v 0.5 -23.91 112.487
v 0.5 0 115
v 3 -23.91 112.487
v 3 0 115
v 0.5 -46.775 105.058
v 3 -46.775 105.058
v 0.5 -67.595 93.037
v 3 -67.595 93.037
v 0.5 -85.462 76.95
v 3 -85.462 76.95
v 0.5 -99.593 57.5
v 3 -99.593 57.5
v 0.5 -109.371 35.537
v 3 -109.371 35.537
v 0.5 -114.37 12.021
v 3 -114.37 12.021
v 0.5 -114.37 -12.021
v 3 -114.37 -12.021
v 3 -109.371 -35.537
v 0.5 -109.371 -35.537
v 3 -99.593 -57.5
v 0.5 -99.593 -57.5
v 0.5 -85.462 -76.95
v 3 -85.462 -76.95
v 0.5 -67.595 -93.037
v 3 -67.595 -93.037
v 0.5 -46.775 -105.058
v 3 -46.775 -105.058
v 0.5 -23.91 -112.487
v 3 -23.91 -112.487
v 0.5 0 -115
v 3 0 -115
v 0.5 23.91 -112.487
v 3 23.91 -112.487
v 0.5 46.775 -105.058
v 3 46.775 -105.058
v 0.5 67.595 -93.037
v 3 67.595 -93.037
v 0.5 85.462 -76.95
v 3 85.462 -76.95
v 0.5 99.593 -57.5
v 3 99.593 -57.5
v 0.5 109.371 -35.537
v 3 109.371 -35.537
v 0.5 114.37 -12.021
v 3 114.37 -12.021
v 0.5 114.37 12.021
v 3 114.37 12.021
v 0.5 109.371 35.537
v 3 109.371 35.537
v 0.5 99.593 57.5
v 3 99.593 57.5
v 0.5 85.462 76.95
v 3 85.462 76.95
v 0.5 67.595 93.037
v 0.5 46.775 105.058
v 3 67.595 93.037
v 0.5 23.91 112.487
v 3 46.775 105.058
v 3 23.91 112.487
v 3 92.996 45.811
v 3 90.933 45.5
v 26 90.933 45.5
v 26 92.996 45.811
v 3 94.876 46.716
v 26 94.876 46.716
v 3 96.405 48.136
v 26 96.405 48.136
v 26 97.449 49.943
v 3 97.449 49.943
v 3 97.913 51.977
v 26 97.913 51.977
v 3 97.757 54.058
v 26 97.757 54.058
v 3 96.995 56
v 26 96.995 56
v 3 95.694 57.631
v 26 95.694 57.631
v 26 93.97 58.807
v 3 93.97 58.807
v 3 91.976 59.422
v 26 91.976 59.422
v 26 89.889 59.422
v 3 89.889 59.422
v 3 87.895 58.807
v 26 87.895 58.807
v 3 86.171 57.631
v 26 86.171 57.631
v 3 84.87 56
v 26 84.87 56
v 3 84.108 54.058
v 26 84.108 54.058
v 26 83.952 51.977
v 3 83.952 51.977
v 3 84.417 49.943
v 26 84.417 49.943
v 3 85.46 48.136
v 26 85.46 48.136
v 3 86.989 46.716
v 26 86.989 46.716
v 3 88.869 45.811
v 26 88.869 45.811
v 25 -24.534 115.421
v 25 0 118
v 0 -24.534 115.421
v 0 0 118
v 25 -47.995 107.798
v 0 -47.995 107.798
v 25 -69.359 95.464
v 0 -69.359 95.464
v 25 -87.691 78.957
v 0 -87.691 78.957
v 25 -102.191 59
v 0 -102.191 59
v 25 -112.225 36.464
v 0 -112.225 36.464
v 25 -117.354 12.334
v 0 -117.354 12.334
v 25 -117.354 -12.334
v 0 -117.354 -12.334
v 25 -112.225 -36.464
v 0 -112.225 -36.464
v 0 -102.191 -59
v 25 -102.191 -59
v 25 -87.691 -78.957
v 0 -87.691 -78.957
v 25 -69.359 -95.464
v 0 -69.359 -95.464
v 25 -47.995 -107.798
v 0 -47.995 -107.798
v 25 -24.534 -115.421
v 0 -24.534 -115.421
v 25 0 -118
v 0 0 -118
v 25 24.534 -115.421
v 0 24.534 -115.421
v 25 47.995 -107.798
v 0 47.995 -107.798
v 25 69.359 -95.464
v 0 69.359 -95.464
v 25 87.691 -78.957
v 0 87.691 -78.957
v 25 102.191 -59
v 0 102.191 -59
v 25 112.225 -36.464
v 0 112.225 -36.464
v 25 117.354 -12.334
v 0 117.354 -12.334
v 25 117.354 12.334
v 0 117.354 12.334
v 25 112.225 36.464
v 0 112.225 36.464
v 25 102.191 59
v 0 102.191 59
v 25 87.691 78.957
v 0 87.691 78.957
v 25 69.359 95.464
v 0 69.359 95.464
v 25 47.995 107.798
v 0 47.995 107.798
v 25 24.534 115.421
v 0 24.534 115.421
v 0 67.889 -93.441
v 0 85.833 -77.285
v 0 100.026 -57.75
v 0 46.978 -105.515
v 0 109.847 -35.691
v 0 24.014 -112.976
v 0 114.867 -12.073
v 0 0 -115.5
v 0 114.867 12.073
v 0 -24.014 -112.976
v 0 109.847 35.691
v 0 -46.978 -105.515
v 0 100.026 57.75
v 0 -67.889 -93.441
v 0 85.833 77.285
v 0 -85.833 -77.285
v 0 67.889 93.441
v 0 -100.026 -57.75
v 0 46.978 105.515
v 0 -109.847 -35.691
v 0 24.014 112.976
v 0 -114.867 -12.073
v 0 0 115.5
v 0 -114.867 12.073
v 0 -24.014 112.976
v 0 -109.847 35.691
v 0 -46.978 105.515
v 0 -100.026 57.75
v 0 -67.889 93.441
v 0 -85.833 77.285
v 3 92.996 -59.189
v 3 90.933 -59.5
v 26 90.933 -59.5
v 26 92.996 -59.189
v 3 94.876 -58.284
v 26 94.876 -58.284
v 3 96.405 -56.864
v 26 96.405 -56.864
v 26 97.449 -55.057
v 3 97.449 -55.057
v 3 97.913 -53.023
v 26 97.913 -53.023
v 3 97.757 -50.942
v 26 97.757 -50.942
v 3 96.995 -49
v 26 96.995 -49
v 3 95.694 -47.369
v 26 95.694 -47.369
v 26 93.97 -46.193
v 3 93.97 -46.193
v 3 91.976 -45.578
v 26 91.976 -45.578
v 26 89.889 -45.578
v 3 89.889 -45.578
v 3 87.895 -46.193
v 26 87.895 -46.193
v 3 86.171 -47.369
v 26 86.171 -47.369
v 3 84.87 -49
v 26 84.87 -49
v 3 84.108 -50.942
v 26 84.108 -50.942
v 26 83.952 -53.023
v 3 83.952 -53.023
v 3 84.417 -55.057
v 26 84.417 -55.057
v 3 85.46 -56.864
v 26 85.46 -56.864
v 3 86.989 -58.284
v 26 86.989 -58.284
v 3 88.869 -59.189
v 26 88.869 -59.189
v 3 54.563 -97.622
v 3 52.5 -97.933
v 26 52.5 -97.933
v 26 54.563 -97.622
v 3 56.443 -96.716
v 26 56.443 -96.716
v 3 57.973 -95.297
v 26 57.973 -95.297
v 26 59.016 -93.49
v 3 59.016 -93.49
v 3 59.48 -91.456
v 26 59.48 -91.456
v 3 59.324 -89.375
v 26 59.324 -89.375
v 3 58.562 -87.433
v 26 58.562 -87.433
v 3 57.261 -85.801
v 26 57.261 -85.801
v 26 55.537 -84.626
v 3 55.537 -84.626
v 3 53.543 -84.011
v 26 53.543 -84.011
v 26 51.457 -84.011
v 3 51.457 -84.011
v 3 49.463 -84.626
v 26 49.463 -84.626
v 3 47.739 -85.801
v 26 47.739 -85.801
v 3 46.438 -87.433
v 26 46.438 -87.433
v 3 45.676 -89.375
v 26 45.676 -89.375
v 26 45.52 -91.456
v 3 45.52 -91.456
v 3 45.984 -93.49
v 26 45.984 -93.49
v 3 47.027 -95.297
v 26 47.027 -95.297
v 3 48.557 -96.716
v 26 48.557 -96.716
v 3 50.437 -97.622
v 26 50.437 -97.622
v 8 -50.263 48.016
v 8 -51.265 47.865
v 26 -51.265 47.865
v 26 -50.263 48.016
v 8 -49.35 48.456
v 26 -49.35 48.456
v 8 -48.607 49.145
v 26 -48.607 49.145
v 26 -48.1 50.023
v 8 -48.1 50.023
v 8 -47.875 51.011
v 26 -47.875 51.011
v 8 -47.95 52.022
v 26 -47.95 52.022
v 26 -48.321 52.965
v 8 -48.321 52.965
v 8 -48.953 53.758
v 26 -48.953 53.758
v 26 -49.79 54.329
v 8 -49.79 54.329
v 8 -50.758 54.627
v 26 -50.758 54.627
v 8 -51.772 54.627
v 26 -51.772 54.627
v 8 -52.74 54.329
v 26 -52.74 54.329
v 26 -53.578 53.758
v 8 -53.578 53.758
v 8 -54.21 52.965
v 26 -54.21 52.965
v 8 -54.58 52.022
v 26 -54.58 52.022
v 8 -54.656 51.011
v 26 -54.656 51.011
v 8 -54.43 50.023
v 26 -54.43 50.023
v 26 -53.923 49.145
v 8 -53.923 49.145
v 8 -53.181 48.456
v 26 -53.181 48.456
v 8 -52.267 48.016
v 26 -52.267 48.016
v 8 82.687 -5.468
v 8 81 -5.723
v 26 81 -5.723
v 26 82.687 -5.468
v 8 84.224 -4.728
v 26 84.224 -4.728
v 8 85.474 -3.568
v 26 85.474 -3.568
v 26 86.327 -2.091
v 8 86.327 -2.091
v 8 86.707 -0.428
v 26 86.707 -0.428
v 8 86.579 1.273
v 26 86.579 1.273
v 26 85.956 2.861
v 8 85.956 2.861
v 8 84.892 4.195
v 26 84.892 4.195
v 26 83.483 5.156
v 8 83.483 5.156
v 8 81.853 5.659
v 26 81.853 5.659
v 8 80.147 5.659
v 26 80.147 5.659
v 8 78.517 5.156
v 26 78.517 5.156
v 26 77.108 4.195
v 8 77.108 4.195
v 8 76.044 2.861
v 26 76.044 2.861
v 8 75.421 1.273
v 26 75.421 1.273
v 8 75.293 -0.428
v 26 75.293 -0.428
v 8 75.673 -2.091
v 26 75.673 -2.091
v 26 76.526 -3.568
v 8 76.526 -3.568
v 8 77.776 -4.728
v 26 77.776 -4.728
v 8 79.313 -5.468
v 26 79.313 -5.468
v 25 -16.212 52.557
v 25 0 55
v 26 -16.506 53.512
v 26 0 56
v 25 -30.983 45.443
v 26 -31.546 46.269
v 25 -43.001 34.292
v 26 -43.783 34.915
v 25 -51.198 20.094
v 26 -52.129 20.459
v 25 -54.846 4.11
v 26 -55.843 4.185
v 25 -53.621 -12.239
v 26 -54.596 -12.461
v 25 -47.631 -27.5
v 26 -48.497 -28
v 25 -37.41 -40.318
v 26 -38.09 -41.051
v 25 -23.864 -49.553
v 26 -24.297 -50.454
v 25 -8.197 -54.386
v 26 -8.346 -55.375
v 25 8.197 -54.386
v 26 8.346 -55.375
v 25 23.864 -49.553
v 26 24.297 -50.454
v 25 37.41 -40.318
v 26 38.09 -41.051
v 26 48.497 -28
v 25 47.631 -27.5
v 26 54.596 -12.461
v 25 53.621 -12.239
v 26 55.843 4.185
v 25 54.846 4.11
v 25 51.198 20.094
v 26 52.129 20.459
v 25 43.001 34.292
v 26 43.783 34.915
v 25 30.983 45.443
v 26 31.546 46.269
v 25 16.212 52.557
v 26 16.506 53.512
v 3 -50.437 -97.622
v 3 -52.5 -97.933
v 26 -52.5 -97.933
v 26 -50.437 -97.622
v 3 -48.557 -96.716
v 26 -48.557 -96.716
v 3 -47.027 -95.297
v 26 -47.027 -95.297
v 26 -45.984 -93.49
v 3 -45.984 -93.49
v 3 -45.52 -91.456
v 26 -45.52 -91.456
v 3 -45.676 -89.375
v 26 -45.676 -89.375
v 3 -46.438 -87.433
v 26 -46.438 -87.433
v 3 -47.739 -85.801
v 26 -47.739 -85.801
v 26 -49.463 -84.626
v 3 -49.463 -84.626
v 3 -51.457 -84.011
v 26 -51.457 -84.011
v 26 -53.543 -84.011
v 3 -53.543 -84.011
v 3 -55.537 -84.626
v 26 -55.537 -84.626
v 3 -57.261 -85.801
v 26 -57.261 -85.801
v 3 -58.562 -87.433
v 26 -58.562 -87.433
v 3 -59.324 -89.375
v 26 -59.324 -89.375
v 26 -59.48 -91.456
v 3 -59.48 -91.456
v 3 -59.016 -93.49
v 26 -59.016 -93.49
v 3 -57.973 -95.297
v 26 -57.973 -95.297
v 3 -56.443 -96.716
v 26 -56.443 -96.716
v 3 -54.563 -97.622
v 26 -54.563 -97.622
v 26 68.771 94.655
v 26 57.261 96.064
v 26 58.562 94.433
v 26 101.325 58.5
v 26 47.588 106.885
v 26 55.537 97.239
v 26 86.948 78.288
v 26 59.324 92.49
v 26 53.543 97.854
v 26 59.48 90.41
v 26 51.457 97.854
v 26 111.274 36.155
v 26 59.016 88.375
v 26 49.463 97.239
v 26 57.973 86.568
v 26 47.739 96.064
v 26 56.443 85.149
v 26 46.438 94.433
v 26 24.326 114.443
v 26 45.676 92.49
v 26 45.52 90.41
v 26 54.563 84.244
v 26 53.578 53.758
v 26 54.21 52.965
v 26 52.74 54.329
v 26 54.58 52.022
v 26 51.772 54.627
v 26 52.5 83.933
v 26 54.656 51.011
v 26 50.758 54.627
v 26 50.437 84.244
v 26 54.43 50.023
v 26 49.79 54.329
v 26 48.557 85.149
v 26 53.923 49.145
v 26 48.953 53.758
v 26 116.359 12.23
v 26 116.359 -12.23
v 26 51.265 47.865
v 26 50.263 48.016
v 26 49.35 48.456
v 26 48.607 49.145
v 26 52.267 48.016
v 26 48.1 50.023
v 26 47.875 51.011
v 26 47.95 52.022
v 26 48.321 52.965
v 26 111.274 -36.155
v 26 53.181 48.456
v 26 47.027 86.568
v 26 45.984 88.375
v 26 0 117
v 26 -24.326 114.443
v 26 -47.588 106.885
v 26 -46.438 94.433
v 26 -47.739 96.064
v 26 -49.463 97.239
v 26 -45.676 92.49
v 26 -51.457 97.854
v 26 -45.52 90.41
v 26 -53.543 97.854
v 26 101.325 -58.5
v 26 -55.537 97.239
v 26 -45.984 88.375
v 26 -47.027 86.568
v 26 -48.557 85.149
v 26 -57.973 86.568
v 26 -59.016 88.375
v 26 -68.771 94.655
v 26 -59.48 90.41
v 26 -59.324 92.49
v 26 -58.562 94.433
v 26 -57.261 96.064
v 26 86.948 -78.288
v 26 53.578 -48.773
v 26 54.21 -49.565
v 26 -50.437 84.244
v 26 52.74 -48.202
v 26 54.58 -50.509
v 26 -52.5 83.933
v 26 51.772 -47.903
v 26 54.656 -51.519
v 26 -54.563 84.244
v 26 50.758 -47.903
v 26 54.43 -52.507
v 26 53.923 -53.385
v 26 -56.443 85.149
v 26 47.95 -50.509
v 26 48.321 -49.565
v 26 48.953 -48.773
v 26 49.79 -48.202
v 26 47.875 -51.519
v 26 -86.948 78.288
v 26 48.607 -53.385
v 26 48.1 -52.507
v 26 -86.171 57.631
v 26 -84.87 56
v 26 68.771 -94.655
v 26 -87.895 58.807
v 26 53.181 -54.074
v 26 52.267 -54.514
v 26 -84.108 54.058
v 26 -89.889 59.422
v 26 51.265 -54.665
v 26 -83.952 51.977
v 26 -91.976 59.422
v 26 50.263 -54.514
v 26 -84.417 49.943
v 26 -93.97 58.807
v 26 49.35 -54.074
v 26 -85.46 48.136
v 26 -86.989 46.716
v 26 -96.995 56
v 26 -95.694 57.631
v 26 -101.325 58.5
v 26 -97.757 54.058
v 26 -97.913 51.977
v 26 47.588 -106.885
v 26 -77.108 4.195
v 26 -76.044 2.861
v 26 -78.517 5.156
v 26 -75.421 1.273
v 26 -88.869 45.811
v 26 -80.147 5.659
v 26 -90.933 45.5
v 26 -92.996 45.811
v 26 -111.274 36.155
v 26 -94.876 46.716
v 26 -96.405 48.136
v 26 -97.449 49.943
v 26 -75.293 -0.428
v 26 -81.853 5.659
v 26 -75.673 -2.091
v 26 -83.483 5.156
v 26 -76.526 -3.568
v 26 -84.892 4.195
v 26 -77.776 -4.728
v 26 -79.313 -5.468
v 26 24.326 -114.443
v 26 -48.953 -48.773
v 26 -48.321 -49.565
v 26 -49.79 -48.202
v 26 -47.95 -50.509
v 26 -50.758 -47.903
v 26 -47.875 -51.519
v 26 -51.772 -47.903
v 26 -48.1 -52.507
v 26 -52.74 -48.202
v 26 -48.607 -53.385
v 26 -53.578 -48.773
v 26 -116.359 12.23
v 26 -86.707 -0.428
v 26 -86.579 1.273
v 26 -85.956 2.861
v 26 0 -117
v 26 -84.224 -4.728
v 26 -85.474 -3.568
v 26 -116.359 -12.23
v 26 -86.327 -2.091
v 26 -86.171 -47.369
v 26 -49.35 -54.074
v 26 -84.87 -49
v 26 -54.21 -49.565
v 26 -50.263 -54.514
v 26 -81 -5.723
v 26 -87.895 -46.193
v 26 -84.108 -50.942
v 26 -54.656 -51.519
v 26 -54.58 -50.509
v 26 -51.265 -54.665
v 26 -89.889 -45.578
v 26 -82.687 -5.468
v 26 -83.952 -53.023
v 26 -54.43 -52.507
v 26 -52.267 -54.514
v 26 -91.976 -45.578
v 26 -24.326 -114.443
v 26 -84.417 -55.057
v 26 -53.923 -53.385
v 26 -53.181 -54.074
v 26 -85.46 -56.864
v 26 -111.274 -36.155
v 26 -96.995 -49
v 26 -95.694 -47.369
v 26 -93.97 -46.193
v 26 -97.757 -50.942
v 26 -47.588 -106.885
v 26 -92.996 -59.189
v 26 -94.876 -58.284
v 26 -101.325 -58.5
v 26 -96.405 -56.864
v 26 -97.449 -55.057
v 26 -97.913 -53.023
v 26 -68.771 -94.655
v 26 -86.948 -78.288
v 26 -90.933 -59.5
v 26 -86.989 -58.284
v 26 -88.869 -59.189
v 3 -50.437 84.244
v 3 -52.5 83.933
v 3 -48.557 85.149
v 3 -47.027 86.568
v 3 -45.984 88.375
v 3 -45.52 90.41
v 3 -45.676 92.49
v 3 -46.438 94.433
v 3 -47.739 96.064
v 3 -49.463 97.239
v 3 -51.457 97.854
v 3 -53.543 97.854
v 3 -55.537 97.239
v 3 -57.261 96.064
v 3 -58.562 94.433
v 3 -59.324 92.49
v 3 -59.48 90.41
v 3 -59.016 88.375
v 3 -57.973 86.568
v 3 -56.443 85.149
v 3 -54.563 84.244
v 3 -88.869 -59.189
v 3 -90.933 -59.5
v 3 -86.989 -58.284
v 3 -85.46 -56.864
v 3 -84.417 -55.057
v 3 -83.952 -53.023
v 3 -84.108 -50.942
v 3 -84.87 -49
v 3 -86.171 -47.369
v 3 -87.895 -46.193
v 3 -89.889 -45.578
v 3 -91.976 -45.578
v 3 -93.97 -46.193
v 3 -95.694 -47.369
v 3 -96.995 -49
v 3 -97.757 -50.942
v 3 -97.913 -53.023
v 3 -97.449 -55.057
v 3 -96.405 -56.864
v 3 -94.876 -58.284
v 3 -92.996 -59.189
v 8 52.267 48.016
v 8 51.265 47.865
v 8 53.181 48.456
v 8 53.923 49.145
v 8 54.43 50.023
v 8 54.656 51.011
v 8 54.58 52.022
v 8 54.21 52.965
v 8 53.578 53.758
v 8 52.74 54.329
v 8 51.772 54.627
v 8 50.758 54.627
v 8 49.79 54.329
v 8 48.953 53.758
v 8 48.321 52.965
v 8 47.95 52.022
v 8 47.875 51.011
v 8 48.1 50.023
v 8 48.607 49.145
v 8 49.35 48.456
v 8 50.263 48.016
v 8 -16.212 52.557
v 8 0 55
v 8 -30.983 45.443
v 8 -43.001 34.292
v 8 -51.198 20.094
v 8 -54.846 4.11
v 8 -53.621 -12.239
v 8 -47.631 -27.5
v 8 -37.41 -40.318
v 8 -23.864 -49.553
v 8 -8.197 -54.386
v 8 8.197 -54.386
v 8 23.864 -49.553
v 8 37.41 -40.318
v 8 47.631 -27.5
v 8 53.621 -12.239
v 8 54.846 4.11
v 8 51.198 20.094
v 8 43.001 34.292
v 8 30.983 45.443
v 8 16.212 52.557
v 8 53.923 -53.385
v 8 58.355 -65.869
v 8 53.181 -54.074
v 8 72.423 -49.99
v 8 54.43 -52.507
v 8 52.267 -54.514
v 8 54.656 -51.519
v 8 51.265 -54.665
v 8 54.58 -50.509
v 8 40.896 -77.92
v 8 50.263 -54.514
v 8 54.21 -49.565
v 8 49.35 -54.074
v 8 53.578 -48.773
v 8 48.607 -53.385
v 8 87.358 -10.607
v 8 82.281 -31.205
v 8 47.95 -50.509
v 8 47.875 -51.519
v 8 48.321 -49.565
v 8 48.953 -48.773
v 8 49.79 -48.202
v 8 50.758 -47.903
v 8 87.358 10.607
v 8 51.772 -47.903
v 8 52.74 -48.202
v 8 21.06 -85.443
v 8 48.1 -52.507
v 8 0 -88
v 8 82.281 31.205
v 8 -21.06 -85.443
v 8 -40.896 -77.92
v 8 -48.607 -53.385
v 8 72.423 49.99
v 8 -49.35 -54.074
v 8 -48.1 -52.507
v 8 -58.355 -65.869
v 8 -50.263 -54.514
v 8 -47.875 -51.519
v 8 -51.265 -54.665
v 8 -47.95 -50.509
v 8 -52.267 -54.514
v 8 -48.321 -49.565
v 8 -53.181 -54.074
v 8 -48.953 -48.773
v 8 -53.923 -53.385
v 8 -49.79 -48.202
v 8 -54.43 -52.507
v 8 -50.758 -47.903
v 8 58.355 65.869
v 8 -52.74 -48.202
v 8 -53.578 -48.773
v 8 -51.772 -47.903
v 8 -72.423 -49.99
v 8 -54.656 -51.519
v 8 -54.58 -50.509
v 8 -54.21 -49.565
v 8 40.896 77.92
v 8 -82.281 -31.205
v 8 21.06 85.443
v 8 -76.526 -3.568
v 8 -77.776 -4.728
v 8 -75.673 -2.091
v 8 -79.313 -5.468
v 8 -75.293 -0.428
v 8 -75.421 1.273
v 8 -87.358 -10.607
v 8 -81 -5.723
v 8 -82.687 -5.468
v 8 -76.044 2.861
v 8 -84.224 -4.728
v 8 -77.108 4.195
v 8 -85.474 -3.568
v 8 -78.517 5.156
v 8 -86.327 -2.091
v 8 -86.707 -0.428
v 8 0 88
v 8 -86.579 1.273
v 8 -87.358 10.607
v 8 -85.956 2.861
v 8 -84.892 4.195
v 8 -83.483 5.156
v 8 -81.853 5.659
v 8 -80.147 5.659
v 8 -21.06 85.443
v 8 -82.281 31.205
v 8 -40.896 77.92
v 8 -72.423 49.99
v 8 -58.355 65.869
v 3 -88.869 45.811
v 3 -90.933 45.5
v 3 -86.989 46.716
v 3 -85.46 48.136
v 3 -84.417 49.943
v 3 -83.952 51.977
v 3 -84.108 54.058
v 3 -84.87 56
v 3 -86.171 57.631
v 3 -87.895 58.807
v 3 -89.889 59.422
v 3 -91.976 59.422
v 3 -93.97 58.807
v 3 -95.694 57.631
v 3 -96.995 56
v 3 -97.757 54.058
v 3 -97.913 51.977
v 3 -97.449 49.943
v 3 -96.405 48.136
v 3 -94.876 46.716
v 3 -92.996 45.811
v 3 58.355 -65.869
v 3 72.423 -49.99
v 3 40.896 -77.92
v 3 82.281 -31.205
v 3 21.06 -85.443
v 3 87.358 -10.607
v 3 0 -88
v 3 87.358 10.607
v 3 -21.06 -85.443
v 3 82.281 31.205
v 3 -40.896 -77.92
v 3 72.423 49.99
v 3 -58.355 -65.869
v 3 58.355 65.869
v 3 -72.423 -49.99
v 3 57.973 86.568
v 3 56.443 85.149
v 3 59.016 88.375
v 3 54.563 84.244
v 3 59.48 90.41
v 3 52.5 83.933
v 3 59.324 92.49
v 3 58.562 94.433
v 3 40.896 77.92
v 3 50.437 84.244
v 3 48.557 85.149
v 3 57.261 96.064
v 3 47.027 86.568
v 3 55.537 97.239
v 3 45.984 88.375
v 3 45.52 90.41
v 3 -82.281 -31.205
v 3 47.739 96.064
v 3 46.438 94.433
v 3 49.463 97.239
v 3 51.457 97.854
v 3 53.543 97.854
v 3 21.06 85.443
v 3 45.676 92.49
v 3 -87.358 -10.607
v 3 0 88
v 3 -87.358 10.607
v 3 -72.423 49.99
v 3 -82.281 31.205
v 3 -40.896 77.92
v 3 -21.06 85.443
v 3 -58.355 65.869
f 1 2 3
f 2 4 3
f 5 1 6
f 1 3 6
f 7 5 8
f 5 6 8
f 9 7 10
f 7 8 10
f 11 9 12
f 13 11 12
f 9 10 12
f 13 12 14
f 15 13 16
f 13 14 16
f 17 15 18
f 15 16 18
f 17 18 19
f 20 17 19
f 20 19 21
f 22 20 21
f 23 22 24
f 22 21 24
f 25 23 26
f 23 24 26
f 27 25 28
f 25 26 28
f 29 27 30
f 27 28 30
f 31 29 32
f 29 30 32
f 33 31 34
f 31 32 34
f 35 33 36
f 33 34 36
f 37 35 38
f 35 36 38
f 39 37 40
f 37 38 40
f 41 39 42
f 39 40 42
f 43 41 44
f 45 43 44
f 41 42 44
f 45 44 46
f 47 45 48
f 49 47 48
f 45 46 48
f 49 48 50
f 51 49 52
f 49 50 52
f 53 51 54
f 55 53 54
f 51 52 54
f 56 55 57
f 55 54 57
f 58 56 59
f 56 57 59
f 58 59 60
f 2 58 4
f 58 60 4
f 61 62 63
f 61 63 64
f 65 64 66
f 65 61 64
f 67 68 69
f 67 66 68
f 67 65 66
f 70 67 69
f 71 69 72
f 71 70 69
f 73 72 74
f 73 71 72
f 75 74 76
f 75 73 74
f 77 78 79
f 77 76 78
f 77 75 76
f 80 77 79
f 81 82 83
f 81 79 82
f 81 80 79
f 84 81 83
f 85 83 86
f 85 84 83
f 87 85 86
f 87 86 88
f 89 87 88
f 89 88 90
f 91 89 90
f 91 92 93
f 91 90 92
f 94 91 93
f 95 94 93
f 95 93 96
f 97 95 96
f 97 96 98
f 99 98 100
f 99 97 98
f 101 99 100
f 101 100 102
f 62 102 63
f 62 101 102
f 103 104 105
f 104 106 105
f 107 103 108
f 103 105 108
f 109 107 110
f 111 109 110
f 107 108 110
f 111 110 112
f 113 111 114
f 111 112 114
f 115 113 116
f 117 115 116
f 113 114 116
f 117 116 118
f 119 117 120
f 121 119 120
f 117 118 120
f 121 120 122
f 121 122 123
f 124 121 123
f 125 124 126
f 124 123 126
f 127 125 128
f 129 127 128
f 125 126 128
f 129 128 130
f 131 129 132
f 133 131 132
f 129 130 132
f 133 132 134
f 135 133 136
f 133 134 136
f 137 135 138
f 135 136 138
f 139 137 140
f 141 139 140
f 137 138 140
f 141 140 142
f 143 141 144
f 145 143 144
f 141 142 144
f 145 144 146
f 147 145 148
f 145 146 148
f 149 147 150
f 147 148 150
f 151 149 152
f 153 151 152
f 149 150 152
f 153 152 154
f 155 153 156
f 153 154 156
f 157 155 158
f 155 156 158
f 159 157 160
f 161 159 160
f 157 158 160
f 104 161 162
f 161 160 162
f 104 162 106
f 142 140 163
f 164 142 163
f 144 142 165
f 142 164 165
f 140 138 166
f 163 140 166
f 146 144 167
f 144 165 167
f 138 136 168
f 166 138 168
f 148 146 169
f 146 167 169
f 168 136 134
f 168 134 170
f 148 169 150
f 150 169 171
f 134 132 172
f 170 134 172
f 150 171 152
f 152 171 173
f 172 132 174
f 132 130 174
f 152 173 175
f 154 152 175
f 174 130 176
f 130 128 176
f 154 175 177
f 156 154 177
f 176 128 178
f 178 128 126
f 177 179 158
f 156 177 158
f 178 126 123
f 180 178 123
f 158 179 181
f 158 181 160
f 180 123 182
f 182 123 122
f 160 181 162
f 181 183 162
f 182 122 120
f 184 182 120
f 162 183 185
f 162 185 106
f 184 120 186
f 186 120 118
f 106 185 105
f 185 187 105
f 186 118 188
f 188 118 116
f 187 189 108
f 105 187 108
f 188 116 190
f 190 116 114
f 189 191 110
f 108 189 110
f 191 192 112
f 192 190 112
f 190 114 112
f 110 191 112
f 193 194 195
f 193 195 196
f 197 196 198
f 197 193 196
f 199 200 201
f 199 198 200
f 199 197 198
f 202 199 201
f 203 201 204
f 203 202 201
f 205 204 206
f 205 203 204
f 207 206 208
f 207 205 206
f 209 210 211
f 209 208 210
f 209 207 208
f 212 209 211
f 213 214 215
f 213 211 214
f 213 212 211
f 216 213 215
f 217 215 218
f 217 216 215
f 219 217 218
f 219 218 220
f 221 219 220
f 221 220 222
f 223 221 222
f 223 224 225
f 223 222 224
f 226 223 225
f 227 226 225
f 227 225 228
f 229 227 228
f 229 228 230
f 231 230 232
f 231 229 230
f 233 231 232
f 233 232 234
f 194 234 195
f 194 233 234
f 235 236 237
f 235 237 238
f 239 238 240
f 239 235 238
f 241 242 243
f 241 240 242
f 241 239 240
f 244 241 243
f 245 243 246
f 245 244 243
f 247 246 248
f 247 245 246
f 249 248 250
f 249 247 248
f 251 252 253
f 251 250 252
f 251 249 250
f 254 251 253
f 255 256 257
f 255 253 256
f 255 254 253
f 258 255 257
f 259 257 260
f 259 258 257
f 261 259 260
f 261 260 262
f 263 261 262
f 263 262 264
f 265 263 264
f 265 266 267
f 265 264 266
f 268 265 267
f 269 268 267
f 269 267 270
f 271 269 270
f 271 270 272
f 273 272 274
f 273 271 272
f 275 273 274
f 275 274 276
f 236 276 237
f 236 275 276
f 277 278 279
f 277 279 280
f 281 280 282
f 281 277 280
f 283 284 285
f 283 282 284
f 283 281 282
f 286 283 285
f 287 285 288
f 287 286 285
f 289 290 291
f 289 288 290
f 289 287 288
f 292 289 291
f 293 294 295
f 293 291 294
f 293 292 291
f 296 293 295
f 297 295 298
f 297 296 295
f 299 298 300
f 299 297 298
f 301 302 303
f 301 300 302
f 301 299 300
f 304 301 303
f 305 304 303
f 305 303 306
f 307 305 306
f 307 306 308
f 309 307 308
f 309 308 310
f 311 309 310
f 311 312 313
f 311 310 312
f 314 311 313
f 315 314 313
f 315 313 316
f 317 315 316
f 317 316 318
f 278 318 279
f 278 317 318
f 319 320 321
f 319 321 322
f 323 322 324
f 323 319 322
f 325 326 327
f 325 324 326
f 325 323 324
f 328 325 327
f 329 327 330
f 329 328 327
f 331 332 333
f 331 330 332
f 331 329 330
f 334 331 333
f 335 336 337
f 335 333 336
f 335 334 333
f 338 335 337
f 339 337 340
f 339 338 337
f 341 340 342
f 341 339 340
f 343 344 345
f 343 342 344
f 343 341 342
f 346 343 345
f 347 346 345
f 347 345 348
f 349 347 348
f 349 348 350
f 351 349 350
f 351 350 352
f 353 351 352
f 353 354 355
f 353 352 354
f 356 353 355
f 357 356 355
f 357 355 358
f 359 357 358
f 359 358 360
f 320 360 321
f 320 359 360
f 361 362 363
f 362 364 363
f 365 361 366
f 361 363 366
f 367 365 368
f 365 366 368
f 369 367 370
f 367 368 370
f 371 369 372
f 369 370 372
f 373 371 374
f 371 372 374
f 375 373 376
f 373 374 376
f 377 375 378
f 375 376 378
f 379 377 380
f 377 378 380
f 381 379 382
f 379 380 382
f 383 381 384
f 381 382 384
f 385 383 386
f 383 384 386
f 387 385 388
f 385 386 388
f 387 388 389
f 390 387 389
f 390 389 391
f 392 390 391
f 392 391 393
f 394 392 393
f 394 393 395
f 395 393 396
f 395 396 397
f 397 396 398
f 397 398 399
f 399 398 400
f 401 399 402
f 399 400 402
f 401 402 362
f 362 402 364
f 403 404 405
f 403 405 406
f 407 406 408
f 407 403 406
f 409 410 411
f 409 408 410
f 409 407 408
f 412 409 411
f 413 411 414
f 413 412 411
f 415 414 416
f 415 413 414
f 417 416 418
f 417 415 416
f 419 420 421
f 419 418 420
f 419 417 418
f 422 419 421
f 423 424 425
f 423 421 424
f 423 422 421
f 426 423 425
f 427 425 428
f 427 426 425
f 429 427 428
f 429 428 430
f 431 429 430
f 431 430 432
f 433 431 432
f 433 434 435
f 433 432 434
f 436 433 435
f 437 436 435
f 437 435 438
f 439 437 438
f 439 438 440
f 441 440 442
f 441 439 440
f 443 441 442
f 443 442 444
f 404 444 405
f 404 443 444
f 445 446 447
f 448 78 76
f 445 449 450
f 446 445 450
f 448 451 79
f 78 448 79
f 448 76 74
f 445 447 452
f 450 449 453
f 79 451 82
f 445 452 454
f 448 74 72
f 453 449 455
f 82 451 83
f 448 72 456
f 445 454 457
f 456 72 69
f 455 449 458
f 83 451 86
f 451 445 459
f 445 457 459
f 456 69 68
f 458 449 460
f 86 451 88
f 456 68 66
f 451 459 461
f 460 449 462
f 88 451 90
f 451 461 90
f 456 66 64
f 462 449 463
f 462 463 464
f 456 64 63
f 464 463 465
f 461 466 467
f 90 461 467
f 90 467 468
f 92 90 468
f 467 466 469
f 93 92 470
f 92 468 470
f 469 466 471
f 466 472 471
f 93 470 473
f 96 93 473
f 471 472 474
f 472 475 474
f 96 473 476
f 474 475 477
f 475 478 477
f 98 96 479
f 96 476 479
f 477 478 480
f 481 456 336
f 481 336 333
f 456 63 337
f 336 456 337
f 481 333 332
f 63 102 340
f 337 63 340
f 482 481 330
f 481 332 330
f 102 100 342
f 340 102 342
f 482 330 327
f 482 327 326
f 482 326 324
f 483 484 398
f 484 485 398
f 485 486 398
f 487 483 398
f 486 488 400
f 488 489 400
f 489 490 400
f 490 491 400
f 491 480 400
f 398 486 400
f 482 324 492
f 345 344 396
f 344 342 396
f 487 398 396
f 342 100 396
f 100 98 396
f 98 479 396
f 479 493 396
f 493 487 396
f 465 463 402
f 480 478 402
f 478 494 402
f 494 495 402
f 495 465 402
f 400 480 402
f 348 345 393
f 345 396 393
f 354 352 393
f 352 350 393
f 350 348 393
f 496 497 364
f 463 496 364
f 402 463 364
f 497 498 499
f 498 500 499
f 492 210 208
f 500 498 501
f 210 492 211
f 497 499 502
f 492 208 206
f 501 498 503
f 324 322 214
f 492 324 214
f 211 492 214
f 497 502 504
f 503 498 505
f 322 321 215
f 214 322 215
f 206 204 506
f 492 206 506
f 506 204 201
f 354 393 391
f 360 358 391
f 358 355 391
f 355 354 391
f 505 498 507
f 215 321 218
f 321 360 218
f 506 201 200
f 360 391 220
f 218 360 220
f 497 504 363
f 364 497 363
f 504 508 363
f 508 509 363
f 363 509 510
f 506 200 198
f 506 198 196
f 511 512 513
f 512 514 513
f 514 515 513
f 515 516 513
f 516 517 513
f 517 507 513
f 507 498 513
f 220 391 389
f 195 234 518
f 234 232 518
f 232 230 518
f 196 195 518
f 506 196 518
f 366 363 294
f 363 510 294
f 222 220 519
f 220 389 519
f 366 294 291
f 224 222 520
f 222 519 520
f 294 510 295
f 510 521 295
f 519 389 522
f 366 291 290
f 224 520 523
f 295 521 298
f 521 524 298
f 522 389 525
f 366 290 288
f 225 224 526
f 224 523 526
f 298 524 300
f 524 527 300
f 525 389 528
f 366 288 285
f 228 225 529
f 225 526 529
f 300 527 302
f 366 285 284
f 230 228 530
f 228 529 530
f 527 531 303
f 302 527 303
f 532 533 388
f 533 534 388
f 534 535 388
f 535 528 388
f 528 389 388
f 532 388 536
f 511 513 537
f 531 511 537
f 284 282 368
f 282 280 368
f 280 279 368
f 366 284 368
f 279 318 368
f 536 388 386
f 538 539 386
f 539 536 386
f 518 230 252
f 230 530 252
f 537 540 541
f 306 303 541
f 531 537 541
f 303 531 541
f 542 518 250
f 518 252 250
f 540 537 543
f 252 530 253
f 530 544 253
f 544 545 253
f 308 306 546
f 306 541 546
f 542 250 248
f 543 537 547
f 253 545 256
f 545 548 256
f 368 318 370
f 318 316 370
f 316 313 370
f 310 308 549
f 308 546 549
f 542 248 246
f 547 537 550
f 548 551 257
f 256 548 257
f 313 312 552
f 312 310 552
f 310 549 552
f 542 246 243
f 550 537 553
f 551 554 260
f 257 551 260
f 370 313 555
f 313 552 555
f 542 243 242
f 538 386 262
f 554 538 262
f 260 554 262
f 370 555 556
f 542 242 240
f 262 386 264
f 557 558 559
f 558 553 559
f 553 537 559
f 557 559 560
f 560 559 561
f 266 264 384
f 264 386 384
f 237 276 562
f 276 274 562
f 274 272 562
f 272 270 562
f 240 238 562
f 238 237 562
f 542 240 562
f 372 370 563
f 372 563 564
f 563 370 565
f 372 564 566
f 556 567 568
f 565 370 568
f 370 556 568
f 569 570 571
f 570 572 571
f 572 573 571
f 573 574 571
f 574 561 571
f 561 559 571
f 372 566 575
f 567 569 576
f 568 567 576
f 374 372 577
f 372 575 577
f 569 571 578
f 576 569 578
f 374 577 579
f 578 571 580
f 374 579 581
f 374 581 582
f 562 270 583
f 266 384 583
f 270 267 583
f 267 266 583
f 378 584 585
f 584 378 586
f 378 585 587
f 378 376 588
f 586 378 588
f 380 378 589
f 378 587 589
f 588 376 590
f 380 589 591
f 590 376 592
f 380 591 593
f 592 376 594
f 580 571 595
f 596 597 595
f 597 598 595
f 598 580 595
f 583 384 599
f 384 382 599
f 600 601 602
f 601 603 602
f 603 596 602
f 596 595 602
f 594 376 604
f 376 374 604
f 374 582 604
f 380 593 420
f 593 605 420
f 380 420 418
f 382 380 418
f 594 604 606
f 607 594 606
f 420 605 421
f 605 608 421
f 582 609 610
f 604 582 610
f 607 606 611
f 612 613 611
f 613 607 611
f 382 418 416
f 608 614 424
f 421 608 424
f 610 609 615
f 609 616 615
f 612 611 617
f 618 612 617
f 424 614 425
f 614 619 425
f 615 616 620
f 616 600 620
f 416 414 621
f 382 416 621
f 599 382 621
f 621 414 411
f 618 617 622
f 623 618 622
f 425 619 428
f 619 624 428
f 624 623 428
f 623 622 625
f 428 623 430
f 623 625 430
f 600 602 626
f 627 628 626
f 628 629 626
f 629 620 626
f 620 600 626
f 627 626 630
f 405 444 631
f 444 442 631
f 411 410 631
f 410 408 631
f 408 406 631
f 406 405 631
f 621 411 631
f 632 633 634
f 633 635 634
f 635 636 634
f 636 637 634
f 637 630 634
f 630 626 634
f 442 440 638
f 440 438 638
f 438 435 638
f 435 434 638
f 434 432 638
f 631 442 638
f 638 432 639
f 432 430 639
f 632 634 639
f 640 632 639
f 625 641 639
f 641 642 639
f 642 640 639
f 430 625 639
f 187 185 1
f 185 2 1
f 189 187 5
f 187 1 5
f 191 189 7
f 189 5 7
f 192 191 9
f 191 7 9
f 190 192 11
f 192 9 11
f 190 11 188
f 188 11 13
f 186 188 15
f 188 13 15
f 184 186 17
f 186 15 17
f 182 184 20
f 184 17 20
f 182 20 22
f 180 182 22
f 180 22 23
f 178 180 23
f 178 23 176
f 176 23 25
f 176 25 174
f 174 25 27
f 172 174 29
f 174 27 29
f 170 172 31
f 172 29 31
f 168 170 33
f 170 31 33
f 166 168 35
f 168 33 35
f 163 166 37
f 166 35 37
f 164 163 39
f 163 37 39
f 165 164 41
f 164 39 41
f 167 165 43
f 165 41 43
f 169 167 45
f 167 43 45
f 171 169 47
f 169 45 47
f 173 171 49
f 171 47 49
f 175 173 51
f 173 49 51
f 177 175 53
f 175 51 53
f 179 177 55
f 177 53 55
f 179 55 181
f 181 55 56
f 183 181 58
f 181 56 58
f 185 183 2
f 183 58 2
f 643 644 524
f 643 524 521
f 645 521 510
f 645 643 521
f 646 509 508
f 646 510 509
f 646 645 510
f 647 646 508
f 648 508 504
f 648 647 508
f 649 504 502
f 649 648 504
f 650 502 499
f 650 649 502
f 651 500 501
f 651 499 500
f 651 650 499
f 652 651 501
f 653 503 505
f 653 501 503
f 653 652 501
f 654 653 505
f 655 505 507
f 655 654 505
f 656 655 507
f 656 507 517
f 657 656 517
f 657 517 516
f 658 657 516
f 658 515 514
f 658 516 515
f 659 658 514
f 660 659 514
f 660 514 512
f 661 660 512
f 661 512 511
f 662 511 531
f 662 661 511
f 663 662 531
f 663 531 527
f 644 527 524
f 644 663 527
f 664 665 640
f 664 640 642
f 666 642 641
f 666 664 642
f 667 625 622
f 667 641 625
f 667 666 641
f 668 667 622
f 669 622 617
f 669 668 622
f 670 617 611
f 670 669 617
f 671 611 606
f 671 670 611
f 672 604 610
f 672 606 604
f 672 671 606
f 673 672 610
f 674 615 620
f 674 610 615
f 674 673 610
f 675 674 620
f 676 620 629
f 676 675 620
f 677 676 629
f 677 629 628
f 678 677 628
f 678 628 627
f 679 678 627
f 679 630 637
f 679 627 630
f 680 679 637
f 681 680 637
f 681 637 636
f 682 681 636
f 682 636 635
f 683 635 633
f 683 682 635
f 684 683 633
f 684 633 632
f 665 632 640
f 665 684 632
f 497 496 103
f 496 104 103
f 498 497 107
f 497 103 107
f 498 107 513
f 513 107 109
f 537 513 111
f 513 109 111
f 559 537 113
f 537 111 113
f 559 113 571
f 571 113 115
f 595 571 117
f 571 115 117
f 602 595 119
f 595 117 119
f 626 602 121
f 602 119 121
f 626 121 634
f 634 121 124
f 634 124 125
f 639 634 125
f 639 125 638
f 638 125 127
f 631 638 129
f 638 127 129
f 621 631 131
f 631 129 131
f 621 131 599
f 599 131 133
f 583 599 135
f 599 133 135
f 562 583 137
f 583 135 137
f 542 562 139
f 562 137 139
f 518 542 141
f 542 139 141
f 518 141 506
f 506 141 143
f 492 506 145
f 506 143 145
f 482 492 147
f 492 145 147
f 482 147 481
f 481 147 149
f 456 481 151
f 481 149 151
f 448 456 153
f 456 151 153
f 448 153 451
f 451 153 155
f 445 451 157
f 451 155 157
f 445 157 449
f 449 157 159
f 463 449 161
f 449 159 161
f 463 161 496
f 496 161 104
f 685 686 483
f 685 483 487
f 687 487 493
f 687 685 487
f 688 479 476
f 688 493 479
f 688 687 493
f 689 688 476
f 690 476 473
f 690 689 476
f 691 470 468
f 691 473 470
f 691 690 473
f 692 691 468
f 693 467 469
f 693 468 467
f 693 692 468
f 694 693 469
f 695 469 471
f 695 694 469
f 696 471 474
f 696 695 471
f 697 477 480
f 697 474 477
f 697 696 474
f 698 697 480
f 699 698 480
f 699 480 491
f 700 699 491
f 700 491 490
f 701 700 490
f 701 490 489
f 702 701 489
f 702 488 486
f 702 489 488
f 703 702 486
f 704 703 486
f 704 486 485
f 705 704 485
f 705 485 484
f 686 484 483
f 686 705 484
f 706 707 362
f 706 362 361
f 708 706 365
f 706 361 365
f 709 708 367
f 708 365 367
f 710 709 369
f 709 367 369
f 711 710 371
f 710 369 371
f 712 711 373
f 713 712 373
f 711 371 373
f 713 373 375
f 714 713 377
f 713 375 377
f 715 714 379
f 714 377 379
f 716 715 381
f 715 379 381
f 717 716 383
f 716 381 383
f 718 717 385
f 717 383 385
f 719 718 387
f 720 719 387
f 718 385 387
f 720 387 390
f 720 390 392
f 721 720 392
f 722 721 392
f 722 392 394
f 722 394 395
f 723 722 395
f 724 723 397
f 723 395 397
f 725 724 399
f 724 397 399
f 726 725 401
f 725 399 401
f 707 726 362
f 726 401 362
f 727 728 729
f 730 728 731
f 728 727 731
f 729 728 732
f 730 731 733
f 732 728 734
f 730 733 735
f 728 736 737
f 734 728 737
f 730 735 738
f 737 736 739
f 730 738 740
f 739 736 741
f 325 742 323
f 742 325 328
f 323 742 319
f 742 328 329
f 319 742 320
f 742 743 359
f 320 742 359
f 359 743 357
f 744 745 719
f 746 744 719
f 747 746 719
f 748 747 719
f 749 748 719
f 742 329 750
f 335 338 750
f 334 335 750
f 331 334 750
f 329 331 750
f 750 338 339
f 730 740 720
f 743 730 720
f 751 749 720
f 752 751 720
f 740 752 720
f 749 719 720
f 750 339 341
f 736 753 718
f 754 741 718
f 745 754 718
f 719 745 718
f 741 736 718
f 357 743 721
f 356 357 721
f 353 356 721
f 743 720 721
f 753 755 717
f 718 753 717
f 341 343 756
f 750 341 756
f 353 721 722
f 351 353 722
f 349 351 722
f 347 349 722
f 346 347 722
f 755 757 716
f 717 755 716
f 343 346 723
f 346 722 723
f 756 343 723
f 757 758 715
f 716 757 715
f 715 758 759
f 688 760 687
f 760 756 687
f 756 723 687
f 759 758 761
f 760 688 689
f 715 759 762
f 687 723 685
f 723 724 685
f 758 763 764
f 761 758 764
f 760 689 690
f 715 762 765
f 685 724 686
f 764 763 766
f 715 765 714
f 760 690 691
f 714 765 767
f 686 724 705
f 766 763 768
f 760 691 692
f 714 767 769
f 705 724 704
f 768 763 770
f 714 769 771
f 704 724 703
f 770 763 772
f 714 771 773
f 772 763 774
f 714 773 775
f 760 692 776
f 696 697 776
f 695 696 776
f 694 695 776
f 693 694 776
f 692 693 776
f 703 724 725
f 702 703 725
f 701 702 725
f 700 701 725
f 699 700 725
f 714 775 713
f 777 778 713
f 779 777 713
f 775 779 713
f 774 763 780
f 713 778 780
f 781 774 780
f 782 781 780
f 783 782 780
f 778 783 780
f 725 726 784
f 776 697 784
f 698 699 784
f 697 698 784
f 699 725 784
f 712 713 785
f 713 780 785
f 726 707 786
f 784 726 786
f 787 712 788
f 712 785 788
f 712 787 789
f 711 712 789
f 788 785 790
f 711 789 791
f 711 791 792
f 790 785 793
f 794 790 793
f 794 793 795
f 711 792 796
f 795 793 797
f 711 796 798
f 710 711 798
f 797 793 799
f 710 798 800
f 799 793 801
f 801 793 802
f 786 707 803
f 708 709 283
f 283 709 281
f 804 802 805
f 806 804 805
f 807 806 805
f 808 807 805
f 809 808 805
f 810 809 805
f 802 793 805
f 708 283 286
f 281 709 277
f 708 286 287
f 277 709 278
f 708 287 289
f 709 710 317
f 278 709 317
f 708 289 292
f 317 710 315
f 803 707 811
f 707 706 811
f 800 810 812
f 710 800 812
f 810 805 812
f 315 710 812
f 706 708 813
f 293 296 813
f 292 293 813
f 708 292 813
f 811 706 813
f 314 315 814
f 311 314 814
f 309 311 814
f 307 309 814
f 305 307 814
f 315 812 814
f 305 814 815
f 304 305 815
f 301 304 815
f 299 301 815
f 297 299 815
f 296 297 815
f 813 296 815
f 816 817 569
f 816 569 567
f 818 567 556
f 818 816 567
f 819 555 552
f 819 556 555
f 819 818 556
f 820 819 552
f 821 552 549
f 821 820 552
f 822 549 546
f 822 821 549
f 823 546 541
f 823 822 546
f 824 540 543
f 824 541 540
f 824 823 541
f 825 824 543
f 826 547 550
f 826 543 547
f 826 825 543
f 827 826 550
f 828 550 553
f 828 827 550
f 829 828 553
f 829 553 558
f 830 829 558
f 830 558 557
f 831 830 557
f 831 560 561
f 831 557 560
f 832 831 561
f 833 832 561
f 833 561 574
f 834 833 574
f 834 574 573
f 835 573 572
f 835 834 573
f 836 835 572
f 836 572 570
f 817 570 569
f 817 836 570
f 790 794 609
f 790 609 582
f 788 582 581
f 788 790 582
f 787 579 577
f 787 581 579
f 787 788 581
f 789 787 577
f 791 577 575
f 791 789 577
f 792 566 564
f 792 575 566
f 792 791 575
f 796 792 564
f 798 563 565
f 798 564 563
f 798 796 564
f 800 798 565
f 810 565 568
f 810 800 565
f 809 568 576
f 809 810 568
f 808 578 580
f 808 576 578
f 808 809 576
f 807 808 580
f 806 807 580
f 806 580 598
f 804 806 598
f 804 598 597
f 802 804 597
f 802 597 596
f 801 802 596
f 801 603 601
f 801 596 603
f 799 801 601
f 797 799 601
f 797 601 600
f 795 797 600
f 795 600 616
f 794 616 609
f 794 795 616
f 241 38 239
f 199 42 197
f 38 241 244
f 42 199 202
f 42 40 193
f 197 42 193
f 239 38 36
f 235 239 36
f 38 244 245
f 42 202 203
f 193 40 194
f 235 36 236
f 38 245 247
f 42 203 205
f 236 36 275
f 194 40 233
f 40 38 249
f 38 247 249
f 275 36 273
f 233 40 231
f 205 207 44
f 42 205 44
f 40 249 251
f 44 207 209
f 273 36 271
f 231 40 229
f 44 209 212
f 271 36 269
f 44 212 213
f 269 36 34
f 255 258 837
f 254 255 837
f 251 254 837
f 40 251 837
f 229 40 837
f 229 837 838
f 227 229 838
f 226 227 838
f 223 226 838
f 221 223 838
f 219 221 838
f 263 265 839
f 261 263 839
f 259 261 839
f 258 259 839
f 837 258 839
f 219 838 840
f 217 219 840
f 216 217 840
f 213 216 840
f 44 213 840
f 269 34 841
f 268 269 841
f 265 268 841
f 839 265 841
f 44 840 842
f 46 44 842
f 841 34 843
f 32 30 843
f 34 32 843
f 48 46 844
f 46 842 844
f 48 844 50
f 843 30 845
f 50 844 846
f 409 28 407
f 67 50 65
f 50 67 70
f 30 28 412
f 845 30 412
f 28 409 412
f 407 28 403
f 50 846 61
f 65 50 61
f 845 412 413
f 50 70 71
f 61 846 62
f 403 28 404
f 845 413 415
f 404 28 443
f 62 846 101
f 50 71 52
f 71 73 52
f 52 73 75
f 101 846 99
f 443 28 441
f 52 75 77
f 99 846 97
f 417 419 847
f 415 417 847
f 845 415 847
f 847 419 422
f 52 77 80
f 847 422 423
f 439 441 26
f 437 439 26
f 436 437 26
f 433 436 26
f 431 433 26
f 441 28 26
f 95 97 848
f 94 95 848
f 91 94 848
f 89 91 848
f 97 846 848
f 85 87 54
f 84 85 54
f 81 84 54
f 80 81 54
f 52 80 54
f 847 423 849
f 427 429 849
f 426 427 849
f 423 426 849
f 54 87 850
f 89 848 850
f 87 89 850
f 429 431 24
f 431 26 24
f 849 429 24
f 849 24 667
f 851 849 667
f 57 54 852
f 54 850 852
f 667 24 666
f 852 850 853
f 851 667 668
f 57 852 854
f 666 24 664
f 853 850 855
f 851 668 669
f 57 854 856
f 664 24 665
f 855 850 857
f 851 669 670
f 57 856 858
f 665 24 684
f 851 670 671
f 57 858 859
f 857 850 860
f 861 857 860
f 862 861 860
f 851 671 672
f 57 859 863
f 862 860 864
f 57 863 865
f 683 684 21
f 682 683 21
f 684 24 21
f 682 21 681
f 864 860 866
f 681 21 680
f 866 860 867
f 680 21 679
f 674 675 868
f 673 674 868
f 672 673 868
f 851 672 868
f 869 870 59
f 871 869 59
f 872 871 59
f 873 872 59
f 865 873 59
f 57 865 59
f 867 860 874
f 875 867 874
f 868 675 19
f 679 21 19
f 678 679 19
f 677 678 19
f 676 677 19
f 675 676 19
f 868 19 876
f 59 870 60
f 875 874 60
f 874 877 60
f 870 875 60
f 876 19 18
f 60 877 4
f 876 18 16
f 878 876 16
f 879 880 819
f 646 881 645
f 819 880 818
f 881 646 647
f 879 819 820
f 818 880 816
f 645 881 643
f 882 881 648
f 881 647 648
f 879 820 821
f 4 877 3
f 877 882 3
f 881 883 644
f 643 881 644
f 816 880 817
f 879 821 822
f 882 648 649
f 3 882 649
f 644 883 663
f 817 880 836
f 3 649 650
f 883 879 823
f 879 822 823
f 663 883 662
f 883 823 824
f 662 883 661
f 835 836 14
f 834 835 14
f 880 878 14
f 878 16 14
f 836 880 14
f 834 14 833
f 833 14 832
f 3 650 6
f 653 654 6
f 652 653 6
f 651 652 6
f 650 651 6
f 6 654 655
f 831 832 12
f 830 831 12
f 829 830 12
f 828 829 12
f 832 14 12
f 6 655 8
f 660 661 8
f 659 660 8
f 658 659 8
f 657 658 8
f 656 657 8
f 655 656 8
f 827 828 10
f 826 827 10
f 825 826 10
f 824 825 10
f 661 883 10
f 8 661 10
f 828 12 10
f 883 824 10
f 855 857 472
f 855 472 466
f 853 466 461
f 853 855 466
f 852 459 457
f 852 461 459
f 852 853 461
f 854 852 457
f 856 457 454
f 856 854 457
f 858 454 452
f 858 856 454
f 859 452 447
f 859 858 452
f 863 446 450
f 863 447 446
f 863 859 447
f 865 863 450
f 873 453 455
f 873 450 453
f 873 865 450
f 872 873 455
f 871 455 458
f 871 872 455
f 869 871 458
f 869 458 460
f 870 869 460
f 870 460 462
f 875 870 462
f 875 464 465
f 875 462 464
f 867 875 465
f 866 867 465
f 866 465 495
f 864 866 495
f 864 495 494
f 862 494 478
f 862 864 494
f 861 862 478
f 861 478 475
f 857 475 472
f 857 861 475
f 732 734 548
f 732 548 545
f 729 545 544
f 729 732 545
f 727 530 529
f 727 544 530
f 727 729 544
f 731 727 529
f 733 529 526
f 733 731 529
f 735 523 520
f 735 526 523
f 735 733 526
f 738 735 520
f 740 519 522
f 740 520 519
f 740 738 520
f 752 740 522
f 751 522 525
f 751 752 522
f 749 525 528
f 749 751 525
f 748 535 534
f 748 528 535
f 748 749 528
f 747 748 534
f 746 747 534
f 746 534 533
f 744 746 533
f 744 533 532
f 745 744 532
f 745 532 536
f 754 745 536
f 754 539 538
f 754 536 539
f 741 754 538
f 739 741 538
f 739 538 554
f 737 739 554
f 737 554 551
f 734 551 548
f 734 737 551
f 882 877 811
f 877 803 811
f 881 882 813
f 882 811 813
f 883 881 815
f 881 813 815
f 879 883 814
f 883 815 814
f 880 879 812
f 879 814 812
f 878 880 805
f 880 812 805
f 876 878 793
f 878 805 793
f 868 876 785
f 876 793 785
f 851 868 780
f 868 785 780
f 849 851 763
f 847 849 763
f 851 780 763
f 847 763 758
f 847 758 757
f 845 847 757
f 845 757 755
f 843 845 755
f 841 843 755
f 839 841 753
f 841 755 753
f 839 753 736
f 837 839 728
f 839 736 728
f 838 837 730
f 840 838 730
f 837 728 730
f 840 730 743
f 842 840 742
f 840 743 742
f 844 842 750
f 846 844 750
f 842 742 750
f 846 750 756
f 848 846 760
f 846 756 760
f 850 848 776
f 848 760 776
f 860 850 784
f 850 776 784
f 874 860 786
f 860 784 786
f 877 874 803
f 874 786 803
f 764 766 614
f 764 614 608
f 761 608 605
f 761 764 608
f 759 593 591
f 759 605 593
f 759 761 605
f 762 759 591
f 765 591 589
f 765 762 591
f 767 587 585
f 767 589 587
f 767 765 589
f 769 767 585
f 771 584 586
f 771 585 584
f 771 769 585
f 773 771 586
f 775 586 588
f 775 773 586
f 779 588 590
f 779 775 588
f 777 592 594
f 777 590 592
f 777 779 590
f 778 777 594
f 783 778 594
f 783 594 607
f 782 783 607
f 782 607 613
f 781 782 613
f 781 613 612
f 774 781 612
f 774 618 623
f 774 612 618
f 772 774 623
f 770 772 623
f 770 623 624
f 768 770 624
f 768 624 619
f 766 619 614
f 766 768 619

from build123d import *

# Parameters (mm, degrees)
CUT_EXTRUDE_1_DEPTH      = 169.890497068
CUT_EXTRUDE_1_DEPTH_BACK = 169.890497068
SKETCH_2_R               = 7
SKETCH_2_R_2             = 3.4
SKETCH_2_R_3             = 5.7226


with BuildPart() as part:
    # ｽｹｯﾁ1 → 回転1 (revolve)
    with BuildSketch(Plane.XY, mode=Mode.PRIVATE) as revolve_1_sk:
        Polygon((0, 115.5), (0.5, 115), (3, 115), (3, 88), (8, 88), (8, 55), (25, 55), (26, 56), (26, 117), (25, 118), (0, 118), align=None)
    revolve(revolve_1_sk.sketch.rotate(Axis((0, 0, 0), (1, 0, 0)), 90), axis=Axis((0, 0, 0), (1, 0, 0)))

    # ｽｹｯﾁ2 → ｶｯﾄ - 押し出し1 (cut, two sides: drawn at the far end of the back side and taken through both)
    with BuildSketch(Plane(origin=(0, 0, 0), x_dir=(0, 0, -1), z_dir=(1, 0, 0)).offset(-CUT_EXTRUDE_1_DEPTH_BACK)):
        with Locations((90.932667397, 52.5)):
            Circle(SKETCH_2_R)
        with Locations((52.5, 90.932667397)):
            Circle(SKETCH_2_R)
        with Locations((-52.5, 90.932667397)):
            Circle(SKETCH_2_R)
        with Locations((-90.932667397, 52.5)):
            Circle(SKETCH_2_R)
        with Locations((-90.932667397, -52.5)):
            Circle(SKETCH_2_R)
        with Locations((-52.5, -90.932667397)):
            Circle(SKETCH_2_R)
        with Locations((52.5, -90.932667397)):
            Circle(SKETCH_2_R)
        with Locations((90.932667397, -52.5)):
            Circle(SKETCH_2_R)
        with Locations((51.265241636, 51.265241636)):
            Circle(SKETCH_2_R_2)
        with Locations((-51.265241636, 51.265241636)):
            Circle(SKETCH_2_R_2)
        with Locations((-51.265241636, -51.265241636)):
            Circle(SKETCH_2_R_2)
        with Locations((51.265241636, -51.265241636)):
            Circle(SKETCH_2_R_2)
        with Locations((0, 81)):
            Circle(SKETCH_2_R_3)
        with Locations((0, -81)):
            Circle(SKETCH_2_R_3)
    extrude(amount=CUT_EXTRUDE_1_DEPTH + CUT_EXTRUDE_1_DEPTH_BACK, mode=Mode.SUBTRACT)


solid = part.part
